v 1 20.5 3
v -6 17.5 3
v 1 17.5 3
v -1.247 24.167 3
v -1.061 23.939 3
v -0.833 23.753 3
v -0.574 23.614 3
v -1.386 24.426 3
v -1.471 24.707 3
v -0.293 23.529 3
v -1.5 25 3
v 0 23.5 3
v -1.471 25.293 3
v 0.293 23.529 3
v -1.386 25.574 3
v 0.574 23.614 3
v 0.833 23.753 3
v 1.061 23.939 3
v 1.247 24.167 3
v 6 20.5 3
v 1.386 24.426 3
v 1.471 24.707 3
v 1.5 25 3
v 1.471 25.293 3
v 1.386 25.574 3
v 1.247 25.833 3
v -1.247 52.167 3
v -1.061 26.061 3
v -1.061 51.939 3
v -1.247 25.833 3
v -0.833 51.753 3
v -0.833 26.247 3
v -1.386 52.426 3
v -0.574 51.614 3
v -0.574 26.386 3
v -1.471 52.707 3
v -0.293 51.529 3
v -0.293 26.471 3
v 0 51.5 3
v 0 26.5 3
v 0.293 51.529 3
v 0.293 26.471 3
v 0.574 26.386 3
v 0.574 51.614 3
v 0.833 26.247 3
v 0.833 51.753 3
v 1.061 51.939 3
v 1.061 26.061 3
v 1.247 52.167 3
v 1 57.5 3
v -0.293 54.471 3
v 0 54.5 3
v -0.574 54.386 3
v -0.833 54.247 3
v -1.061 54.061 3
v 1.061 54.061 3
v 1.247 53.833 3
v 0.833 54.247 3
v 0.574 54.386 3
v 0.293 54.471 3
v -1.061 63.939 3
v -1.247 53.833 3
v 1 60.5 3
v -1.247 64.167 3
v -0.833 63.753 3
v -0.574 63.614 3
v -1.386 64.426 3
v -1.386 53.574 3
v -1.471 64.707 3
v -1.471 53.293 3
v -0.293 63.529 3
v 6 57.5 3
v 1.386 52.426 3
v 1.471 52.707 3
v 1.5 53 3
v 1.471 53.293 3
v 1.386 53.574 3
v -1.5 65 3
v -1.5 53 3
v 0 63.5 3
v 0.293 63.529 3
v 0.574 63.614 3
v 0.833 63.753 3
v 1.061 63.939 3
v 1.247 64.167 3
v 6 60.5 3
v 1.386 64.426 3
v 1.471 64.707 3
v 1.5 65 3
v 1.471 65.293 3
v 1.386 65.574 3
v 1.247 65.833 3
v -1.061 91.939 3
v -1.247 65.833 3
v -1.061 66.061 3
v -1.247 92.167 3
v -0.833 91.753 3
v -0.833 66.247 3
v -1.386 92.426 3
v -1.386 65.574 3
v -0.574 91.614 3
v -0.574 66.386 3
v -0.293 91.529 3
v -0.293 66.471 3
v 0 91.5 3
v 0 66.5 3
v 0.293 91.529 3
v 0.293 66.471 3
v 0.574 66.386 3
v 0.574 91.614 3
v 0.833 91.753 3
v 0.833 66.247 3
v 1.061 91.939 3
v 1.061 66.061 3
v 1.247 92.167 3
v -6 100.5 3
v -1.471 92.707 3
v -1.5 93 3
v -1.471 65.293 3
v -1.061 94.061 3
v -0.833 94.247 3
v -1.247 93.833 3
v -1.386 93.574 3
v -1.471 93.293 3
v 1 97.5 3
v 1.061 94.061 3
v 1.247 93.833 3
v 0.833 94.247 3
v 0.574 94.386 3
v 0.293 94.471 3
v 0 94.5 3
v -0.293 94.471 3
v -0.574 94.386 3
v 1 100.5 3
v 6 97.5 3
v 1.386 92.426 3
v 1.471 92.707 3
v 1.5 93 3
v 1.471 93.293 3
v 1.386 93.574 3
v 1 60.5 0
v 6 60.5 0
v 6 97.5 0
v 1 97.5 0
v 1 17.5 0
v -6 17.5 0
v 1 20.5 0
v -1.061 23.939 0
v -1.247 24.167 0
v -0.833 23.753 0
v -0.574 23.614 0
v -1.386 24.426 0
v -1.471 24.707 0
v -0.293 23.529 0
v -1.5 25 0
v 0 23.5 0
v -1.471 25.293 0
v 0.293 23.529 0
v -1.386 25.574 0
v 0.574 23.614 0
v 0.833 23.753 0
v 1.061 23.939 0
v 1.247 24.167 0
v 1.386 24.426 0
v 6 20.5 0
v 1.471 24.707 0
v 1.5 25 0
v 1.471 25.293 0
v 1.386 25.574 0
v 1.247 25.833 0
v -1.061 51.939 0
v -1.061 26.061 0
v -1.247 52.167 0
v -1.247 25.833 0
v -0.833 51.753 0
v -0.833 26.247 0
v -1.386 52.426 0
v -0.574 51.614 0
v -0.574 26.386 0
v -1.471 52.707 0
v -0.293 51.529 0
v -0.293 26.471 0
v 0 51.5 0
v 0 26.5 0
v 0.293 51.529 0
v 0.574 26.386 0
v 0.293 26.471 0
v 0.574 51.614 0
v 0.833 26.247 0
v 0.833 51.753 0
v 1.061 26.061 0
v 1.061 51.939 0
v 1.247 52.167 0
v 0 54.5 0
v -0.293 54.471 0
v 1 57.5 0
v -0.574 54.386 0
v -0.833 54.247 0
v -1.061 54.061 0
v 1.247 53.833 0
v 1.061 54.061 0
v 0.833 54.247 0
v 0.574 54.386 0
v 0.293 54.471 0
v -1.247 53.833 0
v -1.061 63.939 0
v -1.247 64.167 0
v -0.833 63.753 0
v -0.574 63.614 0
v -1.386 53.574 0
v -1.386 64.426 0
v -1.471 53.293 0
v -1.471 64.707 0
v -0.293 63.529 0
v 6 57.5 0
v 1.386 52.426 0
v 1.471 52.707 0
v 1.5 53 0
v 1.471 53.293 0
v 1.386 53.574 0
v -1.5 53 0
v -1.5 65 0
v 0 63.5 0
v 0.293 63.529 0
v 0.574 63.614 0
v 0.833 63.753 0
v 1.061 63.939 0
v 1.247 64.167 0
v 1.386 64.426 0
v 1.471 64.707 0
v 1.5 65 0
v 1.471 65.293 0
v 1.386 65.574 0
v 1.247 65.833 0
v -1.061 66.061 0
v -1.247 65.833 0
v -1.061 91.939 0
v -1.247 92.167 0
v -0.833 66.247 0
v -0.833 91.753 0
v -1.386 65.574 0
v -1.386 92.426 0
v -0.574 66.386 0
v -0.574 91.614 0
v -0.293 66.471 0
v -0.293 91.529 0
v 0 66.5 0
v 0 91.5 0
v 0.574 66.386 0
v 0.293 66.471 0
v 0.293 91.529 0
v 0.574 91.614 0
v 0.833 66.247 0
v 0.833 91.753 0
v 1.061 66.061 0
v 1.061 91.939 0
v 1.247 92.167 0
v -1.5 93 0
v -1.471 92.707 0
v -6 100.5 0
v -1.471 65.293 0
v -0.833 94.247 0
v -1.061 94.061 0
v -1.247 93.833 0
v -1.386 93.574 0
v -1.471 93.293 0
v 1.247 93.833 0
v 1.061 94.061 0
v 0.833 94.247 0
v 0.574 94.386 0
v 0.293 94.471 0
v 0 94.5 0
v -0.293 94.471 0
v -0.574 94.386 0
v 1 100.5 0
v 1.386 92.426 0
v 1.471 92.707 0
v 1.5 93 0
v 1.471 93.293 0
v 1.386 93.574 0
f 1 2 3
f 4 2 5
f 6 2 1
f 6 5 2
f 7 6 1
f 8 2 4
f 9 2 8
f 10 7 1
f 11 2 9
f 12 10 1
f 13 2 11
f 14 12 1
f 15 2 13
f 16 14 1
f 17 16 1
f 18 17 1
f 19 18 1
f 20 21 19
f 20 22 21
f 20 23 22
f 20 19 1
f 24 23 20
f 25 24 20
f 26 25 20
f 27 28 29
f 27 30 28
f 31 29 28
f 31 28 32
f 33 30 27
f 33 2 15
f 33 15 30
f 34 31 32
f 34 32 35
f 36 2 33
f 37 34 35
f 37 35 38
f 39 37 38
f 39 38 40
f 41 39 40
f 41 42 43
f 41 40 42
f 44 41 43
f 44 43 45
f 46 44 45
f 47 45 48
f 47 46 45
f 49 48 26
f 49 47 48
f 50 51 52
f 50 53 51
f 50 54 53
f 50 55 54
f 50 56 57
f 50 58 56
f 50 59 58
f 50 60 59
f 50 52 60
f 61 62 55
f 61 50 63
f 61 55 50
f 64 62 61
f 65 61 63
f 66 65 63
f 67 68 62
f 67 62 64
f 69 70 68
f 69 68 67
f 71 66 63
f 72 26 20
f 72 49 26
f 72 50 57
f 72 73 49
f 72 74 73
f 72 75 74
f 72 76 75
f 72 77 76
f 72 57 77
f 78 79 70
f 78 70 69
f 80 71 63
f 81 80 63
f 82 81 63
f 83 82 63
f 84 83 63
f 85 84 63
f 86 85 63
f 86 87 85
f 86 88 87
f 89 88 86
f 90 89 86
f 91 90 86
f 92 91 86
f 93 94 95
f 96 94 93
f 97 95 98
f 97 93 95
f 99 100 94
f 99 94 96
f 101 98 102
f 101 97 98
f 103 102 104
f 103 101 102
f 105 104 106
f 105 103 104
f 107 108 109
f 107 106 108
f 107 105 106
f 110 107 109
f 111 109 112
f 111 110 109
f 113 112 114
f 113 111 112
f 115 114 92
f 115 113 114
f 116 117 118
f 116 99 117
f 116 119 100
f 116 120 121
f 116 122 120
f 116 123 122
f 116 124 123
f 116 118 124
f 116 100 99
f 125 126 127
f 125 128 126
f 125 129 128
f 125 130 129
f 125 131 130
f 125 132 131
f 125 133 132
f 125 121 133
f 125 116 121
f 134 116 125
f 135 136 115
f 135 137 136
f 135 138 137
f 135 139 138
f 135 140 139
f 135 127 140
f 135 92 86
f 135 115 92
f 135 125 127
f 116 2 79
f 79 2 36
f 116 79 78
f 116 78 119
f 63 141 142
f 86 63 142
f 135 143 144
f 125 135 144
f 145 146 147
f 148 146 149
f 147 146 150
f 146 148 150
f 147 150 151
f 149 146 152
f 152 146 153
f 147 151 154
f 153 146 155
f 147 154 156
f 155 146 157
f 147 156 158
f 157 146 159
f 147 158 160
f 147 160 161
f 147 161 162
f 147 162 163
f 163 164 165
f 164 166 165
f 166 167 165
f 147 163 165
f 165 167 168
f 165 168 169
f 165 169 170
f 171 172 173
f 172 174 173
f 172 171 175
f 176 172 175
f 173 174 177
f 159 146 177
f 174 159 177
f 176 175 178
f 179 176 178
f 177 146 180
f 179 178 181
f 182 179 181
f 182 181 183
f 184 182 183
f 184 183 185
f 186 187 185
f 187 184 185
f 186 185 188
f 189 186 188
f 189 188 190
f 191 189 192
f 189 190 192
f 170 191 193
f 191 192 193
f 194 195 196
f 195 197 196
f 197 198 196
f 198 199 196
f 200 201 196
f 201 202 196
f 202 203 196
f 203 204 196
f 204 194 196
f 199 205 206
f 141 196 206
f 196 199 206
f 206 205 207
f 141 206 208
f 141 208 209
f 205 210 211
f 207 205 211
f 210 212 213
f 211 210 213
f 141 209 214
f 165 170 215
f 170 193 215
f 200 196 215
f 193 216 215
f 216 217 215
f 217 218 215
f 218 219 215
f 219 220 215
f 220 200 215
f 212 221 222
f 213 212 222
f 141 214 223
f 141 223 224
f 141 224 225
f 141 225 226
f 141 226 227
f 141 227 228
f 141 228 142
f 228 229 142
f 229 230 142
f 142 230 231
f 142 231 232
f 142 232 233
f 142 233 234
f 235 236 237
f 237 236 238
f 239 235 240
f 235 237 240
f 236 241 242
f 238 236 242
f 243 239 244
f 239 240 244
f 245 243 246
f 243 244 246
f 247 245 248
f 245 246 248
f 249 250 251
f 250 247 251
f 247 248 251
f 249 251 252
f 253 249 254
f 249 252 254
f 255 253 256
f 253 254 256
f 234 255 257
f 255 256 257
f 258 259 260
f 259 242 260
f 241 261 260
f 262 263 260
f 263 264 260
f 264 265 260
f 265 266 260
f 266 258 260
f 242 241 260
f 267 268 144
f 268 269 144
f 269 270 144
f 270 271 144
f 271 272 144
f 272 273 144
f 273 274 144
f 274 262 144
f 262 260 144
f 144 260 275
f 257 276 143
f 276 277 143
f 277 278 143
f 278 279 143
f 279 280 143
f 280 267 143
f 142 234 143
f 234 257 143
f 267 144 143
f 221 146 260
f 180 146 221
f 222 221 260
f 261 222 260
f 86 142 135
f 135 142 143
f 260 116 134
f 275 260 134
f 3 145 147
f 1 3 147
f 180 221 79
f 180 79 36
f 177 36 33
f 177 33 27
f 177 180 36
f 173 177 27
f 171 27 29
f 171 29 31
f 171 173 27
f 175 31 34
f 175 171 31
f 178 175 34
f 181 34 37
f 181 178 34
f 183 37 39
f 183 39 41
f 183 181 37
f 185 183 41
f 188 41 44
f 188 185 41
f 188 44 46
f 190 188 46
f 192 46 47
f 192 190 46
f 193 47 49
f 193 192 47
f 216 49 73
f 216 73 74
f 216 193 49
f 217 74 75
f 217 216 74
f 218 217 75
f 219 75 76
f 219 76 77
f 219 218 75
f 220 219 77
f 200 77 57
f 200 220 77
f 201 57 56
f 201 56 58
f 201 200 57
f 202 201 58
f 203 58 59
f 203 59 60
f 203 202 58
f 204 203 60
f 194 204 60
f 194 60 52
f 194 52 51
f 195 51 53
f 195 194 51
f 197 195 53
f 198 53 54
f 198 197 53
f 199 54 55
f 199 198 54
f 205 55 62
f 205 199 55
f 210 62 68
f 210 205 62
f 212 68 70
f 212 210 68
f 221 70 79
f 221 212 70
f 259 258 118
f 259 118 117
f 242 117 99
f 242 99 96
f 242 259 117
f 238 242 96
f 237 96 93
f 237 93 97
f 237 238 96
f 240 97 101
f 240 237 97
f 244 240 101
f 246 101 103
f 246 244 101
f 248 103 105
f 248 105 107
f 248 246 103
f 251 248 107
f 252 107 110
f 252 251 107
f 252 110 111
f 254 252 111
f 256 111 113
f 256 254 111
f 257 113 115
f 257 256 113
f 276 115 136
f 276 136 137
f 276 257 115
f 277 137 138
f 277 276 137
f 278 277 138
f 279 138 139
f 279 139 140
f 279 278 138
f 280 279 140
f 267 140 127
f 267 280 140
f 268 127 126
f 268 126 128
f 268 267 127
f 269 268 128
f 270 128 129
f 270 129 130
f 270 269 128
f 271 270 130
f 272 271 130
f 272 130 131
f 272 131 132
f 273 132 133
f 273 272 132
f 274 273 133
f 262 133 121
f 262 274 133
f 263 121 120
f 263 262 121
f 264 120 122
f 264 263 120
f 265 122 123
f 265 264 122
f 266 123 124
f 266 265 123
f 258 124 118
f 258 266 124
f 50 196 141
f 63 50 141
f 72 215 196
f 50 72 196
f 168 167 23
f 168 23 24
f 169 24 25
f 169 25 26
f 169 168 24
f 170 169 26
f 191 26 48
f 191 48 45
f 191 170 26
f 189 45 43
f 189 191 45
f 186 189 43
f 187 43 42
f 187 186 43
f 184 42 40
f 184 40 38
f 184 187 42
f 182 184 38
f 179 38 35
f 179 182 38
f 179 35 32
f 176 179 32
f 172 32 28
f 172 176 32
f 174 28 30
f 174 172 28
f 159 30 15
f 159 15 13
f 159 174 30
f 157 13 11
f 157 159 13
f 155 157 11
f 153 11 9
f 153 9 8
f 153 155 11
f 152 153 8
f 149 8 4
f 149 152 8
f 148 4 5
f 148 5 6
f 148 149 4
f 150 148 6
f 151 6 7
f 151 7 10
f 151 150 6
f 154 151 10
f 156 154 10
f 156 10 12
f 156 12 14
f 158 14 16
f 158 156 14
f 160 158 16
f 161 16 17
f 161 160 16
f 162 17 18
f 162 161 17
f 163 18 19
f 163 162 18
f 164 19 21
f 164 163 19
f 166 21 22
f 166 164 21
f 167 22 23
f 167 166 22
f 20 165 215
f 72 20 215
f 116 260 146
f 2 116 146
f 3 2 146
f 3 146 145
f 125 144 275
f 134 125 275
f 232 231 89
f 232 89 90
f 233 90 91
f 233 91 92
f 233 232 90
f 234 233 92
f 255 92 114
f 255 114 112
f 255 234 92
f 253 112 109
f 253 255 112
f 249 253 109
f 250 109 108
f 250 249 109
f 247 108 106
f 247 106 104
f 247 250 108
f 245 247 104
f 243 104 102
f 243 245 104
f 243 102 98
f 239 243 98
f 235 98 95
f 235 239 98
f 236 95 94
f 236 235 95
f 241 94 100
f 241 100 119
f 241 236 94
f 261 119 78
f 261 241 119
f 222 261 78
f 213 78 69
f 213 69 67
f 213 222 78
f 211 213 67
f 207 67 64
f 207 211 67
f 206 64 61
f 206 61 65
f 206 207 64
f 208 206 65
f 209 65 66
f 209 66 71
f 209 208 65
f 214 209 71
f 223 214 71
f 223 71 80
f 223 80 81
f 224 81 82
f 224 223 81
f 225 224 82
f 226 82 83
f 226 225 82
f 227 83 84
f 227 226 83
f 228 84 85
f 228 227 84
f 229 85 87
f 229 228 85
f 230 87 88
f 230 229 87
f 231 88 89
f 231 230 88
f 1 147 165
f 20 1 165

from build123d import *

# Parameters (mm, degrees)
ESQUISSE1_R             = 1.5
BOSS_EXTRU_1_DEPTH      = 3
ESQUISSE2_W             = 12
ESQUISSE2_H             = 17.5
ENL_V_MAT_EXTRU_1_DEPTH = 119.190524155


with BuildPart() as part:
    # Esquisse1 → Boss.-Extru.1 (new body)
    with BuildSketch(Plane.XY):
        Polygon((-6, 0), (6, 0), (6, 17.5), (1, 17.5), (1, 20.5), (6, 20.5), (6, 57.5), (1, 57.5), (1, 60.5), (6, 60.5), (6, 97.5), (1, 97.5), (1, 100.5), (6, 100.5), (6, 118), (-6, 118), align=None)
        with Locations((0, 105)):
            Circle(ESQUISSE1_R, mode=Mode.SUBTRACT)
        with Locations(Location((0, 93, 0), (0, 0, 180))):
            Circle(ESQUISSE1_R, mode=Mode.SUBTRACT)
        with Locations((0, 65)):
            Circle(ESQUISSE1_R, mode=Mode.SUBTRACT)
        with Locations(Location((0, 53, 0), (0, 0, 180))):
            Circle(ESQUISSE1_R, mode=Mode.SUBTRACT)
        with Locations((0, 25)):
            Circle(ESQUISSE1_R, mode=Mode.SUBTRACT)
        with Locations(Location((0, 13, 0), (0, 0, 180))):
            Circle(ESQUISSE1_R, mode=Mode.SUBTRACT)
    extrude(amount=BOSS_EXTRU_1_DEPTH)

    # Esquisse2 → Enlèv. mat.-Extru.1 (cut, through all)
    with BuildSketch(Plane.XY.offset(3)):
        with Locations((0, 109.25)):
            Rectangle(ESQUISSE2_W, ESQUISSE2_H)
        with Locations((0, 8.75)):
            Rectangle(ESQUISSE2_W, ESQUISSE2_H)
    extrude(amount=-ENL_V_MAT_EXTRU_1_DEPTH, mode=Mode.SUBTRACT)


solid = part.part
